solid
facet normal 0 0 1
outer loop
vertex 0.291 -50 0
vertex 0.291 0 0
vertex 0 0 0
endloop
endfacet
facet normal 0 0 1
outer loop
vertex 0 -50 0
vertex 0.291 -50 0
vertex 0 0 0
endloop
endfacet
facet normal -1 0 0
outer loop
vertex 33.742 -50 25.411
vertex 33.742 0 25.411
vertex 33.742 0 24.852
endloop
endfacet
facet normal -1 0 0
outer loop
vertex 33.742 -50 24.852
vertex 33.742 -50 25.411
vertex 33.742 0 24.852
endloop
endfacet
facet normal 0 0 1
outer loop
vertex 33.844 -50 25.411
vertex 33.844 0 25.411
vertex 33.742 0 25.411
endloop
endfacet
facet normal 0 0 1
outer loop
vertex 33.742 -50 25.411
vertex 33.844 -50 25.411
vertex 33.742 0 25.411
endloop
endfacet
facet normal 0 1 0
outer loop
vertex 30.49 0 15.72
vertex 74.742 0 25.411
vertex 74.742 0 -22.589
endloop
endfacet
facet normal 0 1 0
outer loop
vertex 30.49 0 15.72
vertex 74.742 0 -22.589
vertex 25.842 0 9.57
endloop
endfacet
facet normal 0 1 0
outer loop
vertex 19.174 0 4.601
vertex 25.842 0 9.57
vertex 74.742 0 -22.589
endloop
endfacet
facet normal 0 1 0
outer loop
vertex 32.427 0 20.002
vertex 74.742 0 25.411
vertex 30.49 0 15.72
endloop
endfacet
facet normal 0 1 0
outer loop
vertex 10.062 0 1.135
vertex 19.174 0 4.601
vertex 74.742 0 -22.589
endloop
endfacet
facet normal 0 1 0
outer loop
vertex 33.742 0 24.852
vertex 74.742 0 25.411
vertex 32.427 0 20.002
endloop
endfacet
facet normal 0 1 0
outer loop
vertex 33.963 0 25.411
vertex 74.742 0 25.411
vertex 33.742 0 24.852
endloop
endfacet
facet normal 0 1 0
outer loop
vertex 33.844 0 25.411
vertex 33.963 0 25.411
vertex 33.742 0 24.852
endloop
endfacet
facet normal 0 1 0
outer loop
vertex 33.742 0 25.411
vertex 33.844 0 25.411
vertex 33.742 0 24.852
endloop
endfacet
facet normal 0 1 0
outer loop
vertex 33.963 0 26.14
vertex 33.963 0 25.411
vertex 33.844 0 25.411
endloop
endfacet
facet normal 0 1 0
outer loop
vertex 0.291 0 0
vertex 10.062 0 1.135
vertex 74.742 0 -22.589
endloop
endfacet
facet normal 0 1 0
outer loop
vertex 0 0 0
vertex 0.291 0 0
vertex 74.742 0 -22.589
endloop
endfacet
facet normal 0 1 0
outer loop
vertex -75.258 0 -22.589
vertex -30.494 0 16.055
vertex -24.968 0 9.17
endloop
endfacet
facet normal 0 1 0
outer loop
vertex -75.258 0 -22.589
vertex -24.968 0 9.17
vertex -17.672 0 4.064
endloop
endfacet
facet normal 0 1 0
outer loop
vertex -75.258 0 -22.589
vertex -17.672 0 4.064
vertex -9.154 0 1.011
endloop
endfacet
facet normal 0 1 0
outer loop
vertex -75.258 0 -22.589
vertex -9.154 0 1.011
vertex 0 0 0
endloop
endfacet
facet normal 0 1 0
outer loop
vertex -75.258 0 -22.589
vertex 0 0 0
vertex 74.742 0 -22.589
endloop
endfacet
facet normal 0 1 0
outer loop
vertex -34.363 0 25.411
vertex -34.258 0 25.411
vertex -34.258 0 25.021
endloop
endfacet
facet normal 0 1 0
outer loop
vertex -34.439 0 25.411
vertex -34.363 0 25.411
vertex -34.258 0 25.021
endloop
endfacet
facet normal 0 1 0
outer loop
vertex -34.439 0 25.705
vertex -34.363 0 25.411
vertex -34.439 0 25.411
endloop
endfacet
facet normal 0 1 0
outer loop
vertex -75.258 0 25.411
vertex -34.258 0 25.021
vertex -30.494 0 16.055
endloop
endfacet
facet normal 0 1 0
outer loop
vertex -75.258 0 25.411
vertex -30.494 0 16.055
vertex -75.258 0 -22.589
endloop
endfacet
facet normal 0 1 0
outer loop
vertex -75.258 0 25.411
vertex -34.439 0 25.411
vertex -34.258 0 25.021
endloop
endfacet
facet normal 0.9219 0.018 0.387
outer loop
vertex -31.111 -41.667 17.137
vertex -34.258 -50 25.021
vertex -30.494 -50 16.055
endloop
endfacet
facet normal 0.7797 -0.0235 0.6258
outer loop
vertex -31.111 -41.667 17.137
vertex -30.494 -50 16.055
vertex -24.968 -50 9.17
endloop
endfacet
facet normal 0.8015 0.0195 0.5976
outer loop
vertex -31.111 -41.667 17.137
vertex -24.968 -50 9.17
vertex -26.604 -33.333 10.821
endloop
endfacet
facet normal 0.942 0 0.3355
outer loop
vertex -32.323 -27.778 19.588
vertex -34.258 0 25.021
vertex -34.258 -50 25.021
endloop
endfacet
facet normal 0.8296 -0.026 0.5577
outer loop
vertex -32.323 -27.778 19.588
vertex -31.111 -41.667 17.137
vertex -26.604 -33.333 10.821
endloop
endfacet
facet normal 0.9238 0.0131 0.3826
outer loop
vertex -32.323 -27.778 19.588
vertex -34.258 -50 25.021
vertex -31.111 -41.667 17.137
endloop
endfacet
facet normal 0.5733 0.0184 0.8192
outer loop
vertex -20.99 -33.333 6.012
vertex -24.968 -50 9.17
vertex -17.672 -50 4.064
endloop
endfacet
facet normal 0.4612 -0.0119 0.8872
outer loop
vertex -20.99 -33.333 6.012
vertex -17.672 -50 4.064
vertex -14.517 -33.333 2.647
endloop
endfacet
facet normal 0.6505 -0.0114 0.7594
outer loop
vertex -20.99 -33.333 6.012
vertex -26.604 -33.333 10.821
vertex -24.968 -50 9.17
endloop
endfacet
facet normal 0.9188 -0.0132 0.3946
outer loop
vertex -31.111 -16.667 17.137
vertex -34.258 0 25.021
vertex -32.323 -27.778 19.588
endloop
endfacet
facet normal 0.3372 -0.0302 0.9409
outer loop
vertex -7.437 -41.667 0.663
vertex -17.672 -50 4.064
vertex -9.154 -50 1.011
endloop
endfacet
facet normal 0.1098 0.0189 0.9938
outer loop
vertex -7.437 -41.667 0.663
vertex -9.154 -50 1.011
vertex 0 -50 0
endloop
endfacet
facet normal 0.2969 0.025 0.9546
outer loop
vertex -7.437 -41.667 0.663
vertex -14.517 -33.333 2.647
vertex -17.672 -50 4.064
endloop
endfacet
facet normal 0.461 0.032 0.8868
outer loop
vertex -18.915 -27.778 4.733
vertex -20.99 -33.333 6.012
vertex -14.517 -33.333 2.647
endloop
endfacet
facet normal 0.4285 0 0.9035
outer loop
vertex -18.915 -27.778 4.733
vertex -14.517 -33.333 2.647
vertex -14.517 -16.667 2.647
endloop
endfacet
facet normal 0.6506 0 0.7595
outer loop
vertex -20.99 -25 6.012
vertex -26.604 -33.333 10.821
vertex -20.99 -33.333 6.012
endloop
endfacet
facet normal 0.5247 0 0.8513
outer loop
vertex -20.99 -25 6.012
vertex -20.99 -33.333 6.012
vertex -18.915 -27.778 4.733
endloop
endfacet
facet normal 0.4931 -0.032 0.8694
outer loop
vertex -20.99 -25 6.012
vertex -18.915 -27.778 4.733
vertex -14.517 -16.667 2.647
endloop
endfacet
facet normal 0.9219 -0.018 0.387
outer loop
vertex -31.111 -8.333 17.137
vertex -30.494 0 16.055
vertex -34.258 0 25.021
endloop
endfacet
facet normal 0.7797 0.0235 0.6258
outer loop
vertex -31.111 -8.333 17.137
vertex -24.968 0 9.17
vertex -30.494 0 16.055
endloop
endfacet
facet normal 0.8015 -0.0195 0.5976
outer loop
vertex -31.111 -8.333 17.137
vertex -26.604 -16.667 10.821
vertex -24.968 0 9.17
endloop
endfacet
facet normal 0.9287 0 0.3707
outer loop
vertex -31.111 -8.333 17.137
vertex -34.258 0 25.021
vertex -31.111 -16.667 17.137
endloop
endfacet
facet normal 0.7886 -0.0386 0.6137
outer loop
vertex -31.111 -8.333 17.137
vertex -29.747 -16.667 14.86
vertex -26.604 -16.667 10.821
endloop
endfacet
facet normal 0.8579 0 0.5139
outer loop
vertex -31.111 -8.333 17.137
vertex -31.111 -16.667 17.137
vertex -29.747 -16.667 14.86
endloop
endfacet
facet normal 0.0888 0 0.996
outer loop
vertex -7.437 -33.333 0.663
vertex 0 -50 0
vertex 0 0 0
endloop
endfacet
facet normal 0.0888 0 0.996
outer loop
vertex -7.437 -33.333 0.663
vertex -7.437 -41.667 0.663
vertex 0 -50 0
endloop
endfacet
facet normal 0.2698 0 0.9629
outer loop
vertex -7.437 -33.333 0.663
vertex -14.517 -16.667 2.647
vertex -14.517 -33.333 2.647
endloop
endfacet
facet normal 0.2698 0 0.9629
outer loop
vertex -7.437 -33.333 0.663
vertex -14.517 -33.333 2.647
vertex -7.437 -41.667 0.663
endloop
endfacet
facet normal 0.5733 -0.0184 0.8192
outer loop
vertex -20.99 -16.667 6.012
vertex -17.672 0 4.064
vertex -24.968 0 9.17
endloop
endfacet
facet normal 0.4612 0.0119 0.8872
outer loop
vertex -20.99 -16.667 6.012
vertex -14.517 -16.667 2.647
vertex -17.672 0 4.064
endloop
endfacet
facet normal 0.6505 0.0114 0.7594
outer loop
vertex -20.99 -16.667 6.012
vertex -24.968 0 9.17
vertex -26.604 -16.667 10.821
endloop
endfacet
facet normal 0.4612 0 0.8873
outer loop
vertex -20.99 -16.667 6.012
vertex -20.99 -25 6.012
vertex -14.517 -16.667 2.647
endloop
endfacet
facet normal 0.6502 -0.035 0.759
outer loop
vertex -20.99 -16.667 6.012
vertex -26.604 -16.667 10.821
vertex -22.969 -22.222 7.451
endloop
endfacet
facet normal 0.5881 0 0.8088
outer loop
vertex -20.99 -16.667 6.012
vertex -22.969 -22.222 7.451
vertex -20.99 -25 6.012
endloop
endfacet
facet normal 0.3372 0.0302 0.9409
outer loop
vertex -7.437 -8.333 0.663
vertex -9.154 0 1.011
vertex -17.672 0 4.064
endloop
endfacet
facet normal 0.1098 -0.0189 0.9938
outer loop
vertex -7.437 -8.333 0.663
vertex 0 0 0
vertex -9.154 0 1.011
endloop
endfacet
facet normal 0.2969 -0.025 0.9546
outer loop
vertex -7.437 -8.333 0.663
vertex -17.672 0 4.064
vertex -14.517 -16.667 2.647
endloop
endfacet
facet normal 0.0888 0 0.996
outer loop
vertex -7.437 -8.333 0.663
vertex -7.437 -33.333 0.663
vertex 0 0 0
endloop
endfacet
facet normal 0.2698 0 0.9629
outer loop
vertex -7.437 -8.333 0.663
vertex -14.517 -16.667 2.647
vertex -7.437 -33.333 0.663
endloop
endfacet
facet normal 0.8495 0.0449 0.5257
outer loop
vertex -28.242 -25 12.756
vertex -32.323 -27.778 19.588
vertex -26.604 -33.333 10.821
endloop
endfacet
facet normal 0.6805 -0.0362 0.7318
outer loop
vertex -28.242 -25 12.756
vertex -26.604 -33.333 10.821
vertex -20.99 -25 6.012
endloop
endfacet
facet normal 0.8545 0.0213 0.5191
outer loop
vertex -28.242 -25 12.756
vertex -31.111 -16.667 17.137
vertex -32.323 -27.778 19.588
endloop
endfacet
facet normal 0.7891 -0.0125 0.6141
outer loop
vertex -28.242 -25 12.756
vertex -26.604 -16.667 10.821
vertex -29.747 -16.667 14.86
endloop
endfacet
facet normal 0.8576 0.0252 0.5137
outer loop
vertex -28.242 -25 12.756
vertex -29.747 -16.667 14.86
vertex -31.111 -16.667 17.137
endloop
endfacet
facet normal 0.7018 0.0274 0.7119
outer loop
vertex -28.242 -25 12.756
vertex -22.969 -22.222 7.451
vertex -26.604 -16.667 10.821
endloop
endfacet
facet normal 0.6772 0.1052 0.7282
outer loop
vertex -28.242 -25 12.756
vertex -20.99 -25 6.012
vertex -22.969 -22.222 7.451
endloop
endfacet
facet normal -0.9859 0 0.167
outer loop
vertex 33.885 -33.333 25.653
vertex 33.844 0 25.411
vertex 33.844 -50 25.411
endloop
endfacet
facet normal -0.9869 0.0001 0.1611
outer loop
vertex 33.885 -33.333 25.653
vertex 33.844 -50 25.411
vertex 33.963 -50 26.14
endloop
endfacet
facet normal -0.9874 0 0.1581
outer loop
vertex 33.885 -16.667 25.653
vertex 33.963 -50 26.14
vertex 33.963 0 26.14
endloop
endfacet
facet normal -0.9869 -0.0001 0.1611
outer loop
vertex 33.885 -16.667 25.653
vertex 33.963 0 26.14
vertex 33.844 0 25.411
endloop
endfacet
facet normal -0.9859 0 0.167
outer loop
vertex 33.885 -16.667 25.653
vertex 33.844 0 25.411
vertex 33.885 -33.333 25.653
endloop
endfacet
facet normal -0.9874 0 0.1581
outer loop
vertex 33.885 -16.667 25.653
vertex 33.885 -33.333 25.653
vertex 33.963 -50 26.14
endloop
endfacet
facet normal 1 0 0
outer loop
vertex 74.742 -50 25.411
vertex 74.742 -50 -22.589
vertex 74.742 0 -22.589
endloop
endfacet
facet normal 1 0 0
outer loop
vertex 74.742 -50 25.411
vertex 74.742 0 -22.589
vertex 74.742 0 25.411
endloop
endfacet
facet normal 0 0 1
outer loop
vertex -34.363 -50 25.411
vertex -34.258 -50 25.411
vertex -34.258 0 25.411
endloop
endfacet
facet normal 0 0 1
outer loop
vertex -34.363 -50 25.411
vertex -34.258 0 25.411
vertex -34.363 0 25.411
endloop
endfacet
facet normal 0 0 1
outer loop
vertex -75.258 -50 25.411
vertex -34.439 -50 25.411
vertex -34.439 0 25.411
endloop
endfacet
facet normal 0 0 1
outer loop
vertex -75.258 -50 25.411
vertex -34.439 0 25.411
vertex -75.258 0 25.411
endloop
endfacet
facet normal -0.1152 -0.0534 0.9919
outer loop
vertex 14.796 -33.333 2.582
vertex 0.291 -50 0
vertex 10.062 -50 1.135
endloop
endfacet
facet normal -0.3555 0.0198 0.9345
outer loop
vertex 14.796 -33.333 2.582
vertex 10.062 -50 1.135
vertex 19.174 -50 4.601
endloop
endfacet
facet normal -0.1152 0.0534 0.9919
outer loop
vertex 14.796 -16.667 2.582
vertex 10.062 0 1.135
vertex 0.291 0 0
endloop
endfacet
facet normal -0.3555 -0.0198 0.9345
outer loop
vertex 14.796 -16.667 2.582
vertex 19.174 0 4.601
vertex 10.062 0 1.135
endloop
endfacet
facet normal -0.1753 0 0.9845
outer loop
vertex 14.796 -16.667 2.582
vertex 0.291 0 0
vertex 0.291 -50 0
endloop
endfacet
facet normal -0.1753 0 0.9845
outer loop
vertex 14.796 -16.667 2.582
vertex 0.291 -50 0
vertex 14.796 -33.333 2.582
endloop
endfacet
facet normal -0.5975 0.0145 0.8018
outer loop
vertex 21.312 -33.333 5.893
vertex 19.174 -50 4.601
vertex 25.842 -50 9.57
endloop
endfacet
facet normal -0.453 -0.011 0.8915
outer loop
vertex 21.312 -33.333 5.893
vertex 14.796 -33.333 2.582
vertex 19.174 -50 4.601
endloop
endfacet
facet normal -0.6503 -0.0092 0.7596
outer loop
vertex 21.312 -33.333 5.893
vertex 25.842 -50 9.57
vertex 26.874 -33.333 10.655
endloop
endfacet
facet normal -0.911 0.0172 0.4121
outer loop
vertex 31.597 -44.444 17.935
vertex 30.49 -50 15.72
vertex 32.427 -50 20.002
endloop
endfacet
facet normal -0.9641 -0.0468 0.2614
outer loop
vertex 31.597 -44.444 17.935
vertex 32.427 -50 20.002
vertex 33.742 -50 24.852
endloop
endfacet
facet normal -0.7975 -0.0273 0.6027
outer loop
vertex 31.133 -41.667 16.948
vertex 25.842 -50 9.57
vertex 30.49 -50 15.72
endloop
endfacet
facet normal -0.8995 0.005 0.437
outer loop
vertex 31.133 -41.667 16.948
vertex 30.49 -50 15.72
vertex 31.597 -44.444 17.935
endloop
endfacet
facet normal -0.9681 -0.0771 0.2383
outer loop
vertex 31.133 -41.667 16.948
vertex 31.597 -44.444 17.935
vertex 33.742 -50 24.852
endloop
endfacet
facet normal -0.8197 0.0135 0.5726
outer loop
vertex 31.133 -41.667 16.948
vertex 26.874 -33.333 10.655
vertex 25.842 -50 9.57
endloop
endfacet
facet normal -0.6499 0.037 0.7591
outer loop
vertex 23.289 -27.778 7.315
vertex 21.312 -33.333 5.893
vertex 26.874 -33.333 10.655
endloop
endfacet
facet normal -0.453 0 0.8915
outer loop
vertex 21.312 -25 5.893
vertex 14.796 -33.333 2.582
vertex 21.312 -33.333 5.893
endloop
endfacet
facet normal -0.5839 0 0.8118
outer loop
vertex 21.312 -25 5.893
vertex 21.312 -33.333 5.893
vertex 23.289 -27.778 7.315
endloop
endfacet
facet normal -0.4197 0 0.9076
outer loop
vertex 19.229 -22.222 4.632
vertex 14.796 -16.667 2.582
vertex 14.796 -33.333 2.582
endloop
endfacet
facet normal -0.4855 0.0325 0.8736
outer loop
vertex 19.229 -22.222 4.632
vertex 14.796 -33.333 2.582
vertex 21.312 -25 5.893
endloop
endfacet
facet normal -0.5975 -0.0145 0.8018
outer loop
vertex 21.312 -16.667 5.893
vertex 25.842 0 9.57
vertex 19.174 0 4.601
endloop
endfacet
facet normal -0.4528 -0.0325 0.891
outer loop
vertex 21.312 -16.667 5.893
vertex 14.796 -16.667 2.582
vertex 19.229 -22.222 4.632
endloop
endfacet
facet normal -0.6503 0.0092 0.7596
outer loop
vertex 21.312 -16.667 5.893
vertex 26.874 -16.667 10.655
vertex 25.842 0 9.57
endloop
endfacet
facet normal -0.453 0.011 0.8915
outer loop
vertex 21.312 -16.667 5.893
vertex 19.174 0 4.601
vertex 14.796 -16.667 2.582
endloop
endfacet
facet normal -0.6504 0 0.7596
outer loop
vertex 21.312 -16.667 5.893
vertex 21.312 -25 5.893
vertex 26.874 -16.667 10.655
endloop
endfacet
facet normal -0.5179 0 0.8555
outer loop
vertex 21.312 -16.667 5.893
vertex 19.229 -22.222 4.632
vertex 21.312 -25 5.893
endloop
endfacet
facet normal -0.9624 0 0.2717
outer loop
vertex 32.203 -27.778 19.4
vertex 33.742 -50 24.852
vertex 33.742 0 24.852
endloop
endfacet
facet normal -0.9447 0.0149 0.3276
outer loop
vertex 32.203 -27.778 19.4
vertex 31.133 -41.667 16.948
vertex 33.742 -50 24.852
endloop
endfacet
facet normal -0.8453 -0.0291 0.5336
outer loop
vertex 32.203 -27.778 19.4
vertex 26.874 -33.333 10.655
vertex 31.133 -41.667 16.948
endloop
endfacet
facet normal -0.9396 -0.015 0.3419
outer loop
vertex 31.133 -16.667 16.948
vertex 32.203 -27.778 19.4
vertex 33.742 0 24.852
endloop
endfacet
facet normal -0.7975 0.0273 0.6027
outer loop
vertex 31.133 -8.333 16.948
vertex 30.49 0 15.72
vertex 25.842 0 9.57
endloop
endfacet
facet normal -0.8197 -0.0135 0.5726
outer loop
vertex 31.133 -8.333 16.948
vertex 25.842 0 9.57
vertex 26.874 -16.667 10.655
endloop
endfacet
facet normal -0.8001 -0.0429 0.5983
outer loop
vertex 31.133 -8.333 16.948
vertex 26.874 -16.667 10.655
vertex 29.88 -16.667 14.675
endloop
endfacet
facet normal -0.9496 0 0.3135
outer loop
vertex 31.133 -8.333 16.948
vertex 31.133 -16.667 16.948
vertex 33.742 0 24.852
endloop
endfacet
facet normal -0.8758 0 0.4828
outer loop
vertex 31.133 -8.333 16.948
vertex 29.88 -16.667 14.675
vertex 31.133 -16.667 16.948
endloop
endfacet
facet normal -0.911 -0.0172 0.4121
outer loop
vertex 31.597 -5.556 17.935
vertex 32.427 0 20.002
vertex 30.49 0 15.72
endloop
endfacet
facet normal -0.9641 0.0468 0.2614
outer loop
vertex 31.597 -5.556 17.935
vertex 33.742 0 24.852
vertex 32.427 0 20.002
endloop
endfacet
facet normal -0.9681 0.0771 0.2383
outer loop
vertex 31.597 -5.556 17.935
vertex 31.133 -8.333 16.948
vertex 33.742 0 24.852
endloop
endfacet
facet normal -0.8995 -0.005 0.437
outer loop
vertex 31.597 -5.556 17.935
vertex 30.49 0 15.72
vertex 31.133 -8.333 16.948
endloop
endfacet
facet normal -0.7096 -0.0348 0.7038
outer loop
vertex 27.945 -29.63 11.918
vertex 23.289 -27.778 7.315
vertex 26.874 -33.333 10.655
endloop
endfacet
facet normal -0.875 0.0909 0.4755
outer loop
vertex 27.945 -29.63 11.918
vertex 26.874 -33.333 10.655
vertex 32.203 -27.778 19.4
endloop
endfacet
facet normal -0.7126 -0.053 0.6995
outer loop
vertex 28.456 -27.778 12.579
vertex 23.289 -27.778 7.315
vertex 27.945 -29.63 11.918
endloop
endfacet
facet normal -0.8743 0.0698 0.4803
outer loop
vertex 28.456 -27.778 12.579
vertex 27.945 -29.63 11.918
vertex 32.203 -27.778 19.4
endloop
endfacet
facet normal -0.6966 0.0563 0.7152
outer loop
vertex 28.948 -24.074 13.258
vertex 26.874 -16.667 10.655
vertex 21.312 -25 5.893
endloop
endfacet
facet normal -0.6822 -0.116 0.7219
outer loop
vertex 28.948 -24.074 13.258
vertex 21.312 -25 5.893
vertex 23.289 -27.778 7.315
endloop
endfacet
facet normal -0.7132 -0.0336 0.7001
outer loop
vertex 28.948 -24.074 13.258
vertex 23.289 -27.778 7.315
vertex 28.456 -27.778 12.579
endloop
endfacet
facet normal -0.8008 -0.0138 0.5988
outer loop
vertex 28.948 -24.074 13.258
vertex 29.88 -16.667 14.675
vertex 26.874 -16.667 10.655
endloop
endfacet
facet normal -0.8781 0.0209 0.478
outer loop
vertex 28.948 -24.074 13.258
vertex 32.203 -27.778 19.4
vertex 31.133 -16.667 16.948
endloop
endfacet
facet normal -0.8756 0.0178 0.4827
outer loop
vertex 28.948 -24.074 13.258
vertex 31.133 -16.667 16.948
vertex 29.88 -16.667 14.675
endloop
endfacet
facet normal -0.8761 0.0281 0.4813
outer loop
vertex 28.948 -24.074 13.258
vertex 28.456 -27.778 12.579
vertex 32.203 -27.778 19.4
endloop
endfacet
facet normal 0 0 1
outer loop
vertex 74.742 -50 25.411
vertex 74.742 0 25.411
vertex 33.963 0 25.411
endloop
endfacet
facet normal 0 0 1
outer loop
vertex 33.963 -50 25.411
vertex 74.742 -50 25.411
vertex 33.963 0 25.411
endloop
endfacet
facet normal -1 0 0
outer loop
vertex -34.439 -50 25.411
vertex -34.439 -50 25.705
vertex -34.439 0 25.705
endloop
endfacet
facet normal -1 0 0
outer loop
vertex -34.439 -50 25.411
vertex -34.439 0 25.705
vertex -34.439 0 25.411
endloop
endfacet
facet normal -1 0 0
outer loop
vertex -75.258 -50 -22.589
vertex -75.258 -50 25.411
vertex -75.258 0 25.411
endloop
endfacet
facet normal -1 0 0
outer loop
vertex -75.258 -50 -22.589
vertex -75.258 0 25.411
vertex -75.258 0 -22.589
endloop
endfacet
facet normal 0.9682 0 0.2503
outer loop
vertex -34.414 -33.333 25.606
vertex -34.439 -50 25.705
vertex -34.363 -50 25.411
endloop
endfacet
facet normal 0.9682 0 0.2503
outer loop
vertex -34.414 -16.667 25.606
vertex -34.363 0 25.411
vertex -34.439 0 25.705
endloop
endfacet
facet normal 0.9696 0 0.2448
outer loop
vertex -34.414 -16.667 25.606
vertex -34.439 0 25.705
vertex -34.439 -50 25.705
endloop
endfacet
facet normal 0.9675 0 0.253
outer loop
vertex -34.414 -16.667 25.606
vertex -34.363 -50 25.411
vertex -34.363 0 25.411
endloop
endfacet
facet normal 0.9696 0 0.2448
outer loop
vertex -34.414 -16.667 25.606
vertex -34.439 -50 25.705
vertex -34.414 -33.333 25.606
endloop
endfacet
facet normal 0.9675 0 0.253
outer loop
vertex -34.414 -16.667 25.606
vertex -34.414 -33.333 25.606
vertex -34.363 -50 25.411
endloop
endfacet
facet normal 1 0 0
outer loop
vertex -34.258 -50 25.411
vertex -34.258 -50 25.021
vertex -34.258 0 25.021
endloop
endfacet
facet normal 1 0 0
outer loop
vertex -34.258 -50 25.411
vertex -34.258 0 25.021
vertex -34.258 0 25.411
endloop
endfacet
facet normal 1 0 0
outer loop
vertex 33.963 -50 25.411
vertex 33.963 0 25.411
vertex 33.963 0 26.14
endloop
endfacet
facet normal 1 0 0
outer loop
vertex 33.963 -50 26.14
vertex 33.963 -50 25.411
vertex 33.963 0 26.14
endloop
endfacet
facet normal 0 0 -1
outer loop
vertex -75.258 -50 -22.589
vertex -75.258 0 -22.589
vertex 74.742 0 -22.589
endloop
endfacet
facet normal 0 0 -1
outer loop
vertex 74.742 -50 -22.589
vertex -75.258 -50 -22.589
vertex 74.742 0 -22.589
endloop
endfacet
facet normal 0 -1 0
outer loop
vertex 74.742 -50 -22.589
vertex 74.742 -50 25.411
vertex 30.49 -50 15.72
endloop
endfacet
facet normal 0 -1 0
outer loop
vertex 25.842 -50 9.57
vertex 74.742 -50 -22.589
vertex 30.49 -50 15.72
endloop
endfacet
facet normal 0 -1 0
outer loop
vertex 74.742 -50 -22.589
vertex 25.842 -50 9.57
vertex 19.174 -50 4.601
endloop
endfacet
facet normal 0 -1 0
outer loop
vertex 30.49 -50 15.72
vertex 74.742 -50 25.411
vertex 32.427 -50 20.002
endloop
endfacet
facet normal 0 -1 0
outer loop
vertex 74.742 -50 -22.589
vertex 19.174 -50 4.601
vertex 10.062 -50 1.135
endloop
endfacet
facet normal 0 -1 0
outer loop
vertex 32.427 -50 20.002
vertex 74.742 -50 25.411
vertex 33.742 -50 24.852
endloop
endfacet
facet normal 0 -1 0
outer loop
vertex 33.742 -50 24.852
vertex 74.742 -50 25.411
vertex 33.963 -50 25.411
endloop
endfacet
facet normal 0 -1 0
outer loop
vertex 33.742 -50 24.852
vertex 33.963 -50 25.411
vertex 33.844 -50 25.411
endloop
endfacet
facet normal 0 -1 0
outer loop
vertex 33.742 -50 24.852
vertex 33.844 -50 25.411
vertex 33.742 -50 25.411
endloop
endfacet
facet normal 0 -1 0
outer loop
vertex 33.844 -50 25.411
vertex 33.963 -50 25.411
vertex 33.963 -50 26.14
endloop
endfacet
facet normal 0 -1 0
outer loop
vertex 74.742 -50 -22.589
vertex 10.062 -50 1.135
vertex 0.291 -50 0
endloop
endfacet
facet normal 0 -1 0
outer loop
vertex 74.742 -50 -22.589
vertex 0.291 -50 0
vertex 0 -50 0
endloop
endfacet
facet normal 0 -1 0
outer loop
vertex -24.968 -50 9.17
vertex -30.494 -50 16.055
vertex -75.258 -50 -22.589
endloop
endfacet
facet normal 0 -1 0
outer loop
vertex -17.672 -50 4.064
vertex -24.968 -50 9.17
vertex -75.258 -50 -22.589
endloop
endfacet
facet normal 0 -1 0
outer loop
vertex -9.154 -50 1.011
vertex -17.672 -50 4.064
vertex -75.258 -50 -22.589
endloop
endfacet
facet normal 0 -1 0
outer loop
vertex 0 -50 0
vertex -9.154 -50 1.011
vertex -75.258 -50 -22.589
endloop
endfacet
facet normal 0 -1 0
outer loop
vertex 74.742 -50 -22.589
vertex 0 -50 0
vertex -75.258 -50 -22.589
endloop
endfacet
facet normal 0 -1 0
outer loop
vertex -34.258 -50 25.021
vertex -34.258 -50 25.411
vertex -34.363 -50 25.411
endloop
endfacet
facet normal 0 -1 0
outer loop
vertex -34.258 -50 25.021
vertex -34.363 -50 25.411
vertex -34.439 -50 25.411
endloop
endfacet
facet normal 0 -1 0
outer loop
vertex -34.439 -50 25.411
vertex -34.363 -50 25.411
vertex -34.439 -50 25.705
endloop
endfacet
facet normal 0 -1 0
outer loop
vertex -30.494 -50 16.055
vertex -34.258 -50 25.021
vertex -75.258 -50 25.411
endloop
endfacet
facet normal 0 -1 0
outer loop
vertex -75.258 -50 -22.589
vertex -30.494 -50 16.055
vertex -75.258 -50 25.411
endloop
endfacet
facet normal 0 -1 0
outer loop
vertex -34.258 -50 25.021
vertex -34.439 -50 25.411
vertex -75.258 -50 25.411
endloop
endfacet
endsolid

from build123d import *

# Parameters (mm, degrees)
F1_DEPTH = 50
F3_DEPTH = 50


with BuildPart() as f1:
    # F0 (on Front) → F1 (new body)
    with BuildSketch(Plane.XZ):
        Polygon((-34.2579181991, 25.4109162267), (-75.2579181991, 25.4109162267), (-75.2579181991, -22.5890837733), (74.7420818009, -22.5890837733), (74.7420818009, 25.4109162267), (33.7420818009, 25.4109162267), (33.7420818009, 0), (-34.2579181991, 0), align=None)
    extrude(amount=F1_DEPTH)

    # F2 (on Front) → F3 (join)
    with BuildSketch(Plane.XZ):
        with BuildLine():
            add(Edge.make_bspline(
                [(-34.439124167, 25.7045440376), (-29.8644360155, 7.841472514), (-15.2597080741, 0.0492694303), (0, 0)],
                knots=[0, 0, 0, 0, 0.5003378165, 0.5003378165, 0.5003378165, 0.5003378165], degree=3))
            Line((-34.439124167, 25.7045440376), (-34.439124167, 0))
            Line((-34.439124167, 0), (0, 0))
        make_face()
        with BuildLine():
            add(Edge.make_bspline(
                [(0.2911255263, 0), (15.4409229129, 0.0489315649), (31.1494455799, 7.7415126091), (33.9633673429, 26.1402279139)],
                knots=[0.503518811, 0.503518811, 0.503518811, 0.503518811, 1, 1, 1, 1], degree=3))
            Line((0.2911255263, 0), (33.9633673429, 0))
            Line((33.9633673429, 0), (33.9633673429, 26.1402279139))
        make_face()
        with BuildLine():
            Line((0.2911255263, 0), (0, 0))
            add(Edge.make_bspline(
                [(0, 0), (0.0970165471, -0.0003132399), (0.1940595687, -0.0003135084), (0.2911255263, 0)],
                knots=[0.5003378165, 0.5003378165, 0.5003378165, 0.5003378165, 0.503518811, 0.503518811, 0.503518811, 0.503518811], degree=3))
        make_face()
    extrude(amount=F3_DEPTH)


solid = f1.part
